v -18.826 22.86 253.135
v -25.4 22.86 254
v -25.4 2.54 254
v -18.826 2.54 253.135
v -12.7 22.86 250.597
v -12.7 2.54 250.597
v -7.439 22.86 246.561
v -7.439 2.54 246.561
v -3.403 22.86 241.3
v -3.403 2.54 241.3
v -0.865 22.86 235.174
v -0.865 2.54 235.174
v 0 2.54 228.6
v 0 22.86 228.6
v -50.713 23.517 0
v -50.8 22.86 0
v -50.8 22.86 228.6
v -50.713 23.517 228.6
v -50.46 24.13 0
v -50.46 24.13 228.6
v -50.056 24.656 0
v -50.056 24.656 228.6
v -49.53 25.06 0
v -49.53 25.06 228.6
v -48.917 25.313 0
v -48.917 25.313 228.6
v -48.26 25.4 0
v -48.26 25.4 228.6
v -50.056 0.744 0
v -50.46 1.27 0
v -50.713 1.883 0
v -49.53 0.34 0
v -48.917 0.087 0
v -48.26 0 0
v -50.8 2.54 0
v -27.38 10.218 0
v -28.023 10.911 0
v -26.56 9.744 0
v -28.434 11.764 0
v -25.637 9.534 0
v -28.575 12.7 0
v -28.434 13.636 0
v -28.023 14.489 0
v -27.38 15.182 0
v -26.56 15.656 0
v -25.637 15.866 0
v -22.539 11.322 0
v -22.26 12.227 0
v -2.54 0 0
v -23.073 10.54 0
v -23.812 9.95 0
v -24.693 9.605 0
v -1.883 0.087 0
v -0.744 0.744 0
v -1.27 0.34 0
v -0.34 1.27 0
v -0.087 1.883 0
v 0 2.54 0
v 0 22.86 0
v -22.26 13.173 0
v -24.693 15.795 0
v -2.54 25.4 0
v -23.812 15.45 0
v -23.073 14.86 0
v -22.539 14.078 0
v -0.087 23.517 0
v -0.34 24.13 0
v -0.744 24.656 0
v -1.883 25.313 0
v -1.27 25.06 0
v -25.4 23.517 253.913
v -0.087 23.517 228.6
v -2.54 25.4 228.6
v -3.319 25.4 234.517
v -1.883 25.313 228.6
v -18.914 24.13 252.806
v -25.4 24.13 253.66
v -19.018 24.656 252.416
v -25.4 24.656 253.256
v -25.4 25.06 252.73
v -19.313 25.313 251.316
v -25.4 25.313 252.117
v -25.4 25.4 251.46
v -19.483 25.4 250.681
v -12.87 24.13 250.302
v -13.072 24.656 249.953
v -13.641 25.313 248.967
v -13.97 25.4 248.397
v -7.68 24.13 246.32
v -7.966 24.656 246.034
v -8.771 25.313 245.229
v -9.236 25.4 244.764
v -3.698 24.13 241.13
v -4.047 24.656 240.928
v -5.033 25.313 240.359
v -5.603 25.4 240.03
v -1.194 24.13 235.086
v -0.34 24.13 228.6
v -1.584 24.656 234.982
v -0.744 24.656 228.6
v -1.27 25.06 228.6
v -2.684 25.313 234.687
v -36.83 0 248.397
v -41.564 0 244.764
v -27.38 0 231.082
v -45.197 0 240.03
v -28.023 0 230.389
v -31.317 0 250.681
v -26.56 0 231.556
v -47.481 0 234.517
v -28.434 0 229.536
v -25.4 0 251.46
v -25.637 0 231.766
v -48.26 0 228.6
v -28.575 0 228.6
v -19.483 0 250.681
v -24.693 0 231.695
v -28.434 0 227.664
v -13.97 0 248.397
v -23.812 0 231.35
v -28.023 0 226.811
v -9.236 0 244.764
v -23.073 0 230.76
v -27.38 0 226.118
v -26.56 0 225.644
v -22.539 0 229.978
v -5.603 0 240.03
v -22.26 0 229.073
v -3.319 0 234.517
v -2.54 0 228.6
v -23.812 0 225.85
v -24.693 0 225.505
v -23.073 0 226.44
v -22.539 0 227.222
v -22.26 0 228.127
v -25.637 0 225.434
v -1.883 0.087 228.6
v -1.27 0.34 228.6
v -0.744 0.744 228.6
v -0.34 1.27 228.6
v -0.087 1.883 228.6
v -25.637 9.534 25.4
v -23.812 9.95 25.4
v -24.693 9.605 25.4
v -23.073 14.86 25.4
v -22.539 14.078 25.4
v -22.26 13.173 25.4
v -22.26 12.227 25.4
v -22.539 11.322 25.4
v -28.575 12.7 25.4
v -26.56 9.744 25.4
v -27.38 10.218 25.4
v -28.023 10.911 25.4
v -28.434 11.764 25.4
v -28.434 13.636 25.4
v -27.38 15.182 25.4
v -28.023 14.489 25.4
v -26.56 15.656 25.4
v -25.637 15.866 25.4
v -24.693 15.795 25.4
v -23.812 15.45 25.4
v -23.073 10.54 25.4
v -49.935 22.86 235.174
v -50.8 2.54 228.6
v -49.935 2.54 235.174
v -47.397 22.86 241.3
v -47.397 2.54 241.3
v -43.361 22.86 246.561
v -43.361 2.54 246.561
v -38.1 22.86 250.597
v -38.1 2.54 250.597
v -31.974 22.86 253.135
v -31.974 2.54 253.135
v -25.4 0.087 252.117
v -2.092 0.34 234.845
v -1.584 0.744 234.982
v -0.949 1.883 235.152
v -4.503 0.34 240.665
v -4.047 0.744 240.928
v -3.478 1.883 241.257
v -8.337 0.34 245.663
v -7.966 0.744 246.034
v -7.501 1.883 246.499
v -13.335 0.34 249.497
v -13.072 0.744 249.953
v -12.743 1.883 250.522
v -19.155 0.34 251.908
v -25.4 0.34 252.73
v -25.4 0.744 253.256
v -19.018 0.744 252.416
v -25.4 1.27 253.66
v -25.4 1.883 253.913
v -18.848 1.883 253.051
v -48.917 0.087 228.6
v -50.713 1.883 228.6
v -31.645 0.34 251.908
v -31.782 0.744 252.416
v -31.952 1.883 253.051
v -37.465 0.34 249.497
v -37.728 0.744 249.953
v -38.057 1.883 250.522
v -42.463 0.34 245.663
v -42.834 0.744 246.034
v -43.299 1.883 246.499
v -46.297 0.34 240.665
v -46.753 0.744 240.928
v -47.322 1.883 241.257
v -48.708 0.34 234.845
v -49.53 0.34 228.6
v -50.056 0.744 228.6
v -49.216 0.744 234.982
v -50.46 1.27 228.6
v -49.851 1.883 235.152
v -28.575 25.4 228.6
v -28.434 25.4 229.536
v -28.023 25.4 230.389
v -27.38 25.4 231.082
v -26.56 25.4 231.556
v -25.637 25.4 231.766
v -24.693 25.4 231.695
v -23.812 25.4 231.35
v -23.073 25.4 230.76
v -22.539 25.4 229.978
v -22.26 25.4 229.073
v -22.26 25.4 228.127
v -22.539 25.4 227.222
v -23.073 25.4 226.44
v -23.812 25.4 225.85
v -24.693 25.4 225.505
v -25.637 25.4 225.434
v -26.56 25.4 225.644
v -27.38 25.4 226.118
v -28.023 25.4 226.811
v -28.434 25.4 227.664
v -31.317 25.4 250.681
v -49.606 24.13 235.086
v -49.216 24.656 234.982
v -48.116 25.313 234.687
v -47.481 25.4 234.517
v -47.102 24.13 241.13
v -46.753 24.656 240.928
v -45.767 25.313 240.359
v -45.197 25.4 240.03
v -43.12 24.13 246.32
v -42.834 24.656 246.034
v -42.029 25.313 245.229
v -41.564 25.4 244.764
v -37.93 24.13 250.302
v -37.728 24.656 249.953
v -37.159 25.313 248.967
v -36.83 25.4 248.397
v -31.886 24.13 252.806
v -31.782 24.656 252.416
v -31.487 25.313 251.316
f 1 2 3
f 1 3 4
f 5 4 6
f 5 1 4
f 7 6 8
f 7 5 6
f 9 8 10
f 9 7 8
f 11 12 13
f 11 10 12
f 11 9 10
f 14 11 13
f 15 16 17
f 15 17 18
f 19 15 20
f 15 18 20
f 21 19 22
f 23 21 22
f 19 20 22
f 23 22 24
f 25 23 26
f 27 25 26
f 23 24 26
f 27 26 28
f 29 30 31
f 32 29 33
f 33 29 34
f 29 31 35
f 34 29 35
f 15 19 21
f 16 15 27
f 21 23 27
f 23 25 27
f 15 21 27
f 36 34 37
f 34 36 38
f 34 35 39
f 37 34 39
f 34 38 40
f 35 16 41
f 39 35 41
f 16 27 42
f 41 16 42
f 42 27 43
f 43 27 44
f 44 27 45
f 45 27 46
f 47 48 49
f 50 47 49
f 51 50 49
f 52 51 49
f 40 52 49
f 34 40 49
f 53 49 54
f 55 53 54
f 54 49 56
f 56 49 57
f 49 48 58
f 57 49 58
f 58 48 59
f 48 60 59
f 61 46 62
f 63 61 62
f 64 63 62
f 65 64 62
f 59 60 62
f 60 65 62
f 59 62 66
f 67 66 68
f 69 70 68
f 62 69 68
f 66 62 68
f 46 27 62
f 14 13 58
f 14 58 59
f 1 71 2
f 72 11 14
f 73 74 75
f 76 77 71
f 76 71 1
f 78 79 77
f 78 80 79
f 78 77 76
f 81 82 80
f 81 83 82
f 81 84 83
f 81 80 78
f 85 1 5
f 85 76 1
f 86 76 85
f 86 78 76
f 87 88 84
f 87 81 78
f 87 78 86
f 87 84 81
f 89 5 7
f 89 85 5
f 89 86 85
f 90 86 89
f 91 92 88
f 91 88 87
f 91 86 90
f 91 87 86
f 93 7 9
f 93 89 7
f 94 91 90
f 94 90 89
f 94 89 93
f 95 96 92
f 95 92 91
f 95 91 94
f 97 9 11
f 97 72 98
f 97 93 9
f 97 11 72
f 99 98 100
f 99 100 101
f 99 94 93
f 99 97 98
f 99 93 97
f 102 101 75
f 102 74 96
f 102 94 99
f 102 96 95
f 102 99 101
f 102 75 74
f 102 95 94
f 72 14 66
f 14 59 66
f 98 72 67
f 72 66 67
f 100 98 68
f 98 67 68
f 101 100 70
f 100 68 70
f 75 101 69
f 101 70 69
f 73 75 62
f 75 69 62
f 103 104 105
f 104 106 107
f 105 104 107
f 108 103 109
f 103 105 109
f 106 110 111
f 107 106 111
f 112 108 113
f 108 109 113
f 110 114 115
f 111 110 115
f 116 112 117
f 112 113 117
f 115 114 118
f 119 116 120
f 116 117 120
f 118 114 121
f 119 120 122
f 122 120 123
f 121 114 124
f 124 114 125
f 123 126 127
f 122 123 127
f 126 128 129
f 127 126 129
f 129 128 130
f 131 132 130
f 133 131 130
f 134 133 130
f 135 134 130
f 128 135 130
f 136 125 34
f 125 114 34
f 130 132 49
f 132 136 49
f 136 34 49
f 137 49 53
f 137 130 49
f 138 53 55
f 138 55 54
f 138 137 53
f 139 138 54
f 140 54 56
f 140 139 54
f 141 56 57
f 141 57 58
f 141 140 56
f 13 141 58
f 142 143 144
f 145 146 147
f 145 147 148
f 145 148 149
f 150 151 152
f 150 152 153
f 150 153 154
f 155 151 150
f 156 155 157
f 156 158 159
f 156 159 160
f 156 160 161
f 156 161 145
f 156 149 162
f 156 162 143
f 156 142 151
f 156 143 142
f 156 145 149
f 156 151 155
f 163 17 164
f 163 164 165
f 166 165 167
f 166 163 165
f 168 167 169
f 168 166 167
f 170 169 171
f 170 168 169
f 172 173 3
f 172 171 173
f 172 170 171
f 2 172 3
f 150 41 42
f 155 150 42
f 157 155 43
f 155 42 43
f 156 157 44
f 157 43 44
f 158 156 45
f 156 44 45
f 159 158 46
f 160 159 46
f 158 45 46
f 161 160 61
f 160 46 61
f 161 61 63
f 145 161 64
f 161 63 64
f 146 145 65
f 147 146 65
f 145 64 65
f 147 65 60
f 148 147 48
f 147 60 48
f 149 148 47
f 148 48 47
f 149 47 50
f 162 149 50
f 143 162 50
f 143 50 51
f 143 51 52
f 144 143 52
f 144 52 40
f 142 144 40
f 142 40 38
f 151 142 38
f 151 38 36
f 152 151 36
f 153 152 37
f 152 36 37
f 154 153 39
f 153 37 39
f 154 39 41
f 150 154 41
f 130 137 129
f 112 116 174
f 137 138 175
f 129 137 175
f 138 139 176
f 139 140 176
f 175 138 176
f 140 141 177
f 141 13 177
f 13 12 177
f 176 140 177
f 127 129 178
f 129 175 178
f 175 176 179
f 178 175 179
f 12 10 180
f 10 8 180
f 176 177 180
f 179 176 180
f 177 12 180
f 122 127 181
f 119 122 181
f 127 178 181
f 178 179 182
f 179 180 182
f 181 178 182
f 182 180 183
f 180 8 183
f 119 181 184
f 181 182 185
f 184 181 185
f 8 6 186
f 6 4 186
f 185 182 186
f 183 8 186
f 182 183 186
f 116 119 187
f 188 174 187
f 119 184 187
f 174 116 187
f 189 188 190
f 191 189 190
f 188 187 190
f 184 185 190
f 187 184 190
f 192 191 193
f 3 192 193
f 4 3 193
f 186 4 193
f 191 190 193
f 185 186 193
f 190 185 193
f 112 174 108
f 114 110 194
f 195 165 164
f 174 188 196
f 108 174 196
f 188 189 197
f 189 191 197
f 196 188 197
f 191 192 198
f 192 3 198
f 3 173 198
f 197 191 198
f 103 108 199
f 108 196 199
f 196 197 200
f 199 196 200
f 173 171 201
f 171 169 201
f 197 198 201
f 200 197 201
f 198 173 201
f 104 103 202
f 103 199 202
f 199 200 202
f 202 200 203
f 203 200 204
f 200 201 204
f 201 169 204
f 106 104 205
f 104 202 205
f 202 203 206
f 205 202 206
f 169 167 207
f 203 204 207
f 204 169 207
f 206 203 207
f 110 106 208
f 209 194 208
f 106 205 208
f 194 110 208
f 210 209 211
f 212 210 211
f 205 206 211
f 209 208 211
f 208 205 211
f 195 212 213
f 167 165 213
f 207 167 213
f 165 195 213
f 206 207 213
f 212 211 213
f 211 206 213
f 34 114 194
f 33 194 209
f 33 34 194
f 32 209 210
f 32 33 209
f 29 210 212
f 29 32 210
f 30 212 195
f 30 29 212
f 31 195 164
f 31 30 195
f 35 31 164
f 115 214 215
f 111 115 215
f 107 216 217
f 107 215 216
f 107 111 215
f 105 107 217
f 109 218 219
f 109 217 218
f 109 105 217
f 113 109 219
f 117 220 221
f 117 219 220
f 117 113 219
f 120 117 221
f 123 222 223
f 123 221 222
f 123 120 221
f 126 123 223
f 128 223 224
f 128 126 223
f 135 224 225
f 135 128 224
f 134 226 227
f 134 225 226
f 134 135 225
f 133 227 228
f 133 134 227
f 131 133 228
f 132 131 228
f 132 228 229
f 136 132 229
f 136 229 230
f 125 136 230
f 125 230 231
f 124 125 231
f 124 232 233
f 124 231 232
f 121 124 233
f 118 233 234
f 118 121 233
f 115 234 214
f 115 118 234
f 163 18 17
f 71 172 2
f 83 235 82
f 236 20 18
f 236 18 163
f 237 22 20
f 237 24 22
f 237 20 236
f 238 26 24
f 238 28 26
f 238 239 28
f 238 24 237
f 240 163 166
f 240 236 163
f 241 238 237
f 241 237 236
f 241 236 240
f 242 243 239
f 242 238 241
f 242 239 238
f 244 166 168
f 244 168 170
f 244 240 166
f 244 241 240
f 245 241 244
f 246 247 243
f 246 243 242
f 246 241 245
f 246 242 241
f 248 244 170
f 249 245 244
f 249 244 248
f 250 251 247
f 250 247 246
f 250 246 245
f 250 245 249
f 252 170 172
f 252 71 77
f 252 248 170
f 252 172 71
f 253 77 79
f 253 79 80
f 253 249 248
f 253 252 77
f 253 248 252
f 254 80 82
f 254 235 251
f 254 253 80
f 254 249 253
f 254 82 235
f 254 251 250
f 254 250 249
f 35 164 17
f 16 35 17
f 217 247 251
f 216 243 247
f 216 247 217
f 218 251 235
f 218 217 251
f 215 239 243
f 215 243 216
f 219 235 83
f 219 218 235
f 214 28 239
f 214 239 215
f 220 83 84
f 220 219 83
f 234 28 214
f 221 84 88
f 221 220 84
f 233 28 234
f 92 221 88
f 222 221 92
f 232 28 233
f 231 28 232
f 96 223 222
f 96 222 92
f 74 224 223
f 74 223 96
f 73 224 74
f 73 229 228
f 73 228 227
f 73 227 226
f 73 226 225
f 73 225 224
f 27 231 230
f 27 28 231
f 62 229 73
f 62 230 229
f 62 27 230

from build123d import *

# Parameters (mm, degrees)
SKETCH1_W               = 50.8
SKETCH1_H               = 25.4
BOSS_EXTRUDE1_DEPTH     = 254
SKETCH2_R               = 3.175
CUT_EXTRUDE1_DEPTH      = 25.4
FILLET2_R               = 25.4
FILLET1_R               = 2.54
CUT_EXTRUDE2_DEPTH      = 261.272549455
CUT_EXTRUDE2_DEPTH_BACK = 261.272549455
SKETCH3_R               = 3.175


with BuildPart() as part:
    # Sketch1 → Boss-Extrude1 (new body)
    with BuildSketch(Plane.XY):
        with Locations((-25.4, 12.7)):
            Rectangle(SKETCH1_W, SKETCH1_H)
    extrude(amount=BOSS_EXTRUDE1_DEPTH)

    # Sketch2 → Cut-Extrude1 (cut)
    with BuildSketch(Plane(origin=(0, 0, 0), x_dir=(-1, 0, 0), z_dir=(0, 0, -1))):
        with Locations((25.4, 12.7)):
            Circle(SKETCH2_R)
    extrude(amount=-CUT_EXTRUDE1_DEPTH, mode=Mode.SUBTRACT)

    # Fillet2
    fillet2_edges = [part.edges().sort_by_distance(p)[0] for p in [
        (0, 12.7, 254),
        (-50.8, 12.7, 254),
    ]]
    fillet(fillet2_edges, radius=FILLET2_R - 0.0001)  # a hair under: the kernel refuses the full size

    # Fillet1
    fillet1_edges = [part.edges().sort_by_distance(p)[0] for p in [
        (-50.8, 25.4, 114.30005),
        (0, 25.4, 114.30005),
        (-43.360541531, 25.4, 246.560541531),
        (-7.439458469, 25.4, 246.560541531),
        (0, 0, 114.30005),
        (-50.8, 0, 114.30005),
        (-43.360541531, 0, 246.560541531),
        (-7.439458469, 0, 246.560541531),
    ]]
    fillet(fillet1_edges, radius=FILLET1_R)

    # Sketch3 → Cut-Extrude2 (cut, two sides: drawn at the far end of the back side and taken through both)
    with BuildSketch(Plane(origin=(0, 25.4, 0), x_dir=(1, 0, 0), z_dir=(0, 1, 0)).offset(-CUT_EXTRUDE2_DEPTH_BACK)):
        with Locations(Location((-25.4, -228.6, 0), (0, 0, 180))):
            Circle(SKETCH3_R)
    extrude(amount=CUT_EXTRUDE2_DEPTH + CUT_EXTRUDE2_DEPTH_BACK, mode=Mode.SUBTRACT)


solid = part.part
